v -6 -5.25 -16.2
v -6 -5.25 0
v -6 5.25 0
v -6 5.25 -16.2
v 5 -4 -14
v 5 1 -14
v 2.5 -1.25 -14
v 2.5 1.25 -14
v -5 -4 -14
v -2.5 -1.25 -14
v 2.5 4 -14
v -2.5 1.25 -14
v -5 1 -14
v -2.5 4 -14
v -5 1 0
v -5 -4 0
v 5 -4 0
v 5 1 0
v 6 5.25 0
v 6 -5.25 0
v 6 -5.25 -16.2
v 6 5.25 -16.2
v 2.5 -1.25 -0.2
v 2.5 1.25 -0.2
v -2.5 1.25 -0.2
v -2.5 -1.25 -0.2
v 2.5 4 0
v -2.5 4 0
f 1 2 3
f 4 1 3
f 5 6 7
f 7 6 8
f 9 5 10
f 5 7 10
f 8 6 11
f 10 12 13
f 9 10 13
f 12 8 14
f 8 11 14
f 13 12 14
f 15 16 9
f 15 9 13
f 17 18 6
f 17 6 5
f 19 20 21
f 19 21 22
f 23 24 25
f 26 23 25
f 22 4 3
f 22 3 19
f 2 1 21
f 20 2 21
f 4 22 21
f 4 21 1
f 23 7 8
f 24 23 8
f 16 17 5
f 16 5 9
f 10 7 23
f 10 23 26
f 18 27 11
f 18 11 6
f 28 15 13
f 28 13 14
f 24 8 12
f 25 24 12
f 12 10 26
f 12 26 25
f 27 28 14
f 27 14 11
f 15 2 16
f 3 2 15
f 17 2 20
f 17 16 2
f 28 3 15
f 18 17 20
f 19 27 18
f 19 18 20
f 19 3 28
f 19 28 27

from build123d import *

# Parameters (mm, degrees)
ESQUISSE1_W             = 12
ESQUISSE1_H             = 10.5
BOSS_EXTRU_1_DEPTH      = 16.2
ENL_V_MAT_EXTRU_1_DEPTH = 14
ESQUISSE3_W             = 5
ESQUISSE3_H             = 2.5
BOSS_EXTRU_2_DEPTH      = 16


with BuildPart() as part:
    # Esquisse1 → Boss.-Extru.1 (new body)
    with BuildSketch(Plane.XY):
        Rectangle(ESQUISSE1_W, ESQUISSE1_H)
    extrude(amount=-BOSS_EXTRU_1_DEPTH)

    # Esquisse2 → Enlèv. mat.-Extru.1 (cut)
    with BuildSketch(Plane.XY):
        Polygon((-5, 1), (-2.5, 4), (2.5, 4), (5, 1), (5, -4), (-5, -4), align=None)
    extrude(amount=-ENL_V_MAT_EXTRU_1_DEPTH, mode=Mode.SUBTRACT)

    # Esquisse3 → Boss.-Extru.2 (add)
    with BuildSketch(Plane(origin=(0, 0, -16.2), x_dir=(-1, 0, 0), z_dir=(0, 0, -1))):
        Rectangle(ESQUISSE3_W, ESQUISSE3_H)
    extrude(amount=-BOSS_EXTRU_2_DEPTH)


solid = part.part
